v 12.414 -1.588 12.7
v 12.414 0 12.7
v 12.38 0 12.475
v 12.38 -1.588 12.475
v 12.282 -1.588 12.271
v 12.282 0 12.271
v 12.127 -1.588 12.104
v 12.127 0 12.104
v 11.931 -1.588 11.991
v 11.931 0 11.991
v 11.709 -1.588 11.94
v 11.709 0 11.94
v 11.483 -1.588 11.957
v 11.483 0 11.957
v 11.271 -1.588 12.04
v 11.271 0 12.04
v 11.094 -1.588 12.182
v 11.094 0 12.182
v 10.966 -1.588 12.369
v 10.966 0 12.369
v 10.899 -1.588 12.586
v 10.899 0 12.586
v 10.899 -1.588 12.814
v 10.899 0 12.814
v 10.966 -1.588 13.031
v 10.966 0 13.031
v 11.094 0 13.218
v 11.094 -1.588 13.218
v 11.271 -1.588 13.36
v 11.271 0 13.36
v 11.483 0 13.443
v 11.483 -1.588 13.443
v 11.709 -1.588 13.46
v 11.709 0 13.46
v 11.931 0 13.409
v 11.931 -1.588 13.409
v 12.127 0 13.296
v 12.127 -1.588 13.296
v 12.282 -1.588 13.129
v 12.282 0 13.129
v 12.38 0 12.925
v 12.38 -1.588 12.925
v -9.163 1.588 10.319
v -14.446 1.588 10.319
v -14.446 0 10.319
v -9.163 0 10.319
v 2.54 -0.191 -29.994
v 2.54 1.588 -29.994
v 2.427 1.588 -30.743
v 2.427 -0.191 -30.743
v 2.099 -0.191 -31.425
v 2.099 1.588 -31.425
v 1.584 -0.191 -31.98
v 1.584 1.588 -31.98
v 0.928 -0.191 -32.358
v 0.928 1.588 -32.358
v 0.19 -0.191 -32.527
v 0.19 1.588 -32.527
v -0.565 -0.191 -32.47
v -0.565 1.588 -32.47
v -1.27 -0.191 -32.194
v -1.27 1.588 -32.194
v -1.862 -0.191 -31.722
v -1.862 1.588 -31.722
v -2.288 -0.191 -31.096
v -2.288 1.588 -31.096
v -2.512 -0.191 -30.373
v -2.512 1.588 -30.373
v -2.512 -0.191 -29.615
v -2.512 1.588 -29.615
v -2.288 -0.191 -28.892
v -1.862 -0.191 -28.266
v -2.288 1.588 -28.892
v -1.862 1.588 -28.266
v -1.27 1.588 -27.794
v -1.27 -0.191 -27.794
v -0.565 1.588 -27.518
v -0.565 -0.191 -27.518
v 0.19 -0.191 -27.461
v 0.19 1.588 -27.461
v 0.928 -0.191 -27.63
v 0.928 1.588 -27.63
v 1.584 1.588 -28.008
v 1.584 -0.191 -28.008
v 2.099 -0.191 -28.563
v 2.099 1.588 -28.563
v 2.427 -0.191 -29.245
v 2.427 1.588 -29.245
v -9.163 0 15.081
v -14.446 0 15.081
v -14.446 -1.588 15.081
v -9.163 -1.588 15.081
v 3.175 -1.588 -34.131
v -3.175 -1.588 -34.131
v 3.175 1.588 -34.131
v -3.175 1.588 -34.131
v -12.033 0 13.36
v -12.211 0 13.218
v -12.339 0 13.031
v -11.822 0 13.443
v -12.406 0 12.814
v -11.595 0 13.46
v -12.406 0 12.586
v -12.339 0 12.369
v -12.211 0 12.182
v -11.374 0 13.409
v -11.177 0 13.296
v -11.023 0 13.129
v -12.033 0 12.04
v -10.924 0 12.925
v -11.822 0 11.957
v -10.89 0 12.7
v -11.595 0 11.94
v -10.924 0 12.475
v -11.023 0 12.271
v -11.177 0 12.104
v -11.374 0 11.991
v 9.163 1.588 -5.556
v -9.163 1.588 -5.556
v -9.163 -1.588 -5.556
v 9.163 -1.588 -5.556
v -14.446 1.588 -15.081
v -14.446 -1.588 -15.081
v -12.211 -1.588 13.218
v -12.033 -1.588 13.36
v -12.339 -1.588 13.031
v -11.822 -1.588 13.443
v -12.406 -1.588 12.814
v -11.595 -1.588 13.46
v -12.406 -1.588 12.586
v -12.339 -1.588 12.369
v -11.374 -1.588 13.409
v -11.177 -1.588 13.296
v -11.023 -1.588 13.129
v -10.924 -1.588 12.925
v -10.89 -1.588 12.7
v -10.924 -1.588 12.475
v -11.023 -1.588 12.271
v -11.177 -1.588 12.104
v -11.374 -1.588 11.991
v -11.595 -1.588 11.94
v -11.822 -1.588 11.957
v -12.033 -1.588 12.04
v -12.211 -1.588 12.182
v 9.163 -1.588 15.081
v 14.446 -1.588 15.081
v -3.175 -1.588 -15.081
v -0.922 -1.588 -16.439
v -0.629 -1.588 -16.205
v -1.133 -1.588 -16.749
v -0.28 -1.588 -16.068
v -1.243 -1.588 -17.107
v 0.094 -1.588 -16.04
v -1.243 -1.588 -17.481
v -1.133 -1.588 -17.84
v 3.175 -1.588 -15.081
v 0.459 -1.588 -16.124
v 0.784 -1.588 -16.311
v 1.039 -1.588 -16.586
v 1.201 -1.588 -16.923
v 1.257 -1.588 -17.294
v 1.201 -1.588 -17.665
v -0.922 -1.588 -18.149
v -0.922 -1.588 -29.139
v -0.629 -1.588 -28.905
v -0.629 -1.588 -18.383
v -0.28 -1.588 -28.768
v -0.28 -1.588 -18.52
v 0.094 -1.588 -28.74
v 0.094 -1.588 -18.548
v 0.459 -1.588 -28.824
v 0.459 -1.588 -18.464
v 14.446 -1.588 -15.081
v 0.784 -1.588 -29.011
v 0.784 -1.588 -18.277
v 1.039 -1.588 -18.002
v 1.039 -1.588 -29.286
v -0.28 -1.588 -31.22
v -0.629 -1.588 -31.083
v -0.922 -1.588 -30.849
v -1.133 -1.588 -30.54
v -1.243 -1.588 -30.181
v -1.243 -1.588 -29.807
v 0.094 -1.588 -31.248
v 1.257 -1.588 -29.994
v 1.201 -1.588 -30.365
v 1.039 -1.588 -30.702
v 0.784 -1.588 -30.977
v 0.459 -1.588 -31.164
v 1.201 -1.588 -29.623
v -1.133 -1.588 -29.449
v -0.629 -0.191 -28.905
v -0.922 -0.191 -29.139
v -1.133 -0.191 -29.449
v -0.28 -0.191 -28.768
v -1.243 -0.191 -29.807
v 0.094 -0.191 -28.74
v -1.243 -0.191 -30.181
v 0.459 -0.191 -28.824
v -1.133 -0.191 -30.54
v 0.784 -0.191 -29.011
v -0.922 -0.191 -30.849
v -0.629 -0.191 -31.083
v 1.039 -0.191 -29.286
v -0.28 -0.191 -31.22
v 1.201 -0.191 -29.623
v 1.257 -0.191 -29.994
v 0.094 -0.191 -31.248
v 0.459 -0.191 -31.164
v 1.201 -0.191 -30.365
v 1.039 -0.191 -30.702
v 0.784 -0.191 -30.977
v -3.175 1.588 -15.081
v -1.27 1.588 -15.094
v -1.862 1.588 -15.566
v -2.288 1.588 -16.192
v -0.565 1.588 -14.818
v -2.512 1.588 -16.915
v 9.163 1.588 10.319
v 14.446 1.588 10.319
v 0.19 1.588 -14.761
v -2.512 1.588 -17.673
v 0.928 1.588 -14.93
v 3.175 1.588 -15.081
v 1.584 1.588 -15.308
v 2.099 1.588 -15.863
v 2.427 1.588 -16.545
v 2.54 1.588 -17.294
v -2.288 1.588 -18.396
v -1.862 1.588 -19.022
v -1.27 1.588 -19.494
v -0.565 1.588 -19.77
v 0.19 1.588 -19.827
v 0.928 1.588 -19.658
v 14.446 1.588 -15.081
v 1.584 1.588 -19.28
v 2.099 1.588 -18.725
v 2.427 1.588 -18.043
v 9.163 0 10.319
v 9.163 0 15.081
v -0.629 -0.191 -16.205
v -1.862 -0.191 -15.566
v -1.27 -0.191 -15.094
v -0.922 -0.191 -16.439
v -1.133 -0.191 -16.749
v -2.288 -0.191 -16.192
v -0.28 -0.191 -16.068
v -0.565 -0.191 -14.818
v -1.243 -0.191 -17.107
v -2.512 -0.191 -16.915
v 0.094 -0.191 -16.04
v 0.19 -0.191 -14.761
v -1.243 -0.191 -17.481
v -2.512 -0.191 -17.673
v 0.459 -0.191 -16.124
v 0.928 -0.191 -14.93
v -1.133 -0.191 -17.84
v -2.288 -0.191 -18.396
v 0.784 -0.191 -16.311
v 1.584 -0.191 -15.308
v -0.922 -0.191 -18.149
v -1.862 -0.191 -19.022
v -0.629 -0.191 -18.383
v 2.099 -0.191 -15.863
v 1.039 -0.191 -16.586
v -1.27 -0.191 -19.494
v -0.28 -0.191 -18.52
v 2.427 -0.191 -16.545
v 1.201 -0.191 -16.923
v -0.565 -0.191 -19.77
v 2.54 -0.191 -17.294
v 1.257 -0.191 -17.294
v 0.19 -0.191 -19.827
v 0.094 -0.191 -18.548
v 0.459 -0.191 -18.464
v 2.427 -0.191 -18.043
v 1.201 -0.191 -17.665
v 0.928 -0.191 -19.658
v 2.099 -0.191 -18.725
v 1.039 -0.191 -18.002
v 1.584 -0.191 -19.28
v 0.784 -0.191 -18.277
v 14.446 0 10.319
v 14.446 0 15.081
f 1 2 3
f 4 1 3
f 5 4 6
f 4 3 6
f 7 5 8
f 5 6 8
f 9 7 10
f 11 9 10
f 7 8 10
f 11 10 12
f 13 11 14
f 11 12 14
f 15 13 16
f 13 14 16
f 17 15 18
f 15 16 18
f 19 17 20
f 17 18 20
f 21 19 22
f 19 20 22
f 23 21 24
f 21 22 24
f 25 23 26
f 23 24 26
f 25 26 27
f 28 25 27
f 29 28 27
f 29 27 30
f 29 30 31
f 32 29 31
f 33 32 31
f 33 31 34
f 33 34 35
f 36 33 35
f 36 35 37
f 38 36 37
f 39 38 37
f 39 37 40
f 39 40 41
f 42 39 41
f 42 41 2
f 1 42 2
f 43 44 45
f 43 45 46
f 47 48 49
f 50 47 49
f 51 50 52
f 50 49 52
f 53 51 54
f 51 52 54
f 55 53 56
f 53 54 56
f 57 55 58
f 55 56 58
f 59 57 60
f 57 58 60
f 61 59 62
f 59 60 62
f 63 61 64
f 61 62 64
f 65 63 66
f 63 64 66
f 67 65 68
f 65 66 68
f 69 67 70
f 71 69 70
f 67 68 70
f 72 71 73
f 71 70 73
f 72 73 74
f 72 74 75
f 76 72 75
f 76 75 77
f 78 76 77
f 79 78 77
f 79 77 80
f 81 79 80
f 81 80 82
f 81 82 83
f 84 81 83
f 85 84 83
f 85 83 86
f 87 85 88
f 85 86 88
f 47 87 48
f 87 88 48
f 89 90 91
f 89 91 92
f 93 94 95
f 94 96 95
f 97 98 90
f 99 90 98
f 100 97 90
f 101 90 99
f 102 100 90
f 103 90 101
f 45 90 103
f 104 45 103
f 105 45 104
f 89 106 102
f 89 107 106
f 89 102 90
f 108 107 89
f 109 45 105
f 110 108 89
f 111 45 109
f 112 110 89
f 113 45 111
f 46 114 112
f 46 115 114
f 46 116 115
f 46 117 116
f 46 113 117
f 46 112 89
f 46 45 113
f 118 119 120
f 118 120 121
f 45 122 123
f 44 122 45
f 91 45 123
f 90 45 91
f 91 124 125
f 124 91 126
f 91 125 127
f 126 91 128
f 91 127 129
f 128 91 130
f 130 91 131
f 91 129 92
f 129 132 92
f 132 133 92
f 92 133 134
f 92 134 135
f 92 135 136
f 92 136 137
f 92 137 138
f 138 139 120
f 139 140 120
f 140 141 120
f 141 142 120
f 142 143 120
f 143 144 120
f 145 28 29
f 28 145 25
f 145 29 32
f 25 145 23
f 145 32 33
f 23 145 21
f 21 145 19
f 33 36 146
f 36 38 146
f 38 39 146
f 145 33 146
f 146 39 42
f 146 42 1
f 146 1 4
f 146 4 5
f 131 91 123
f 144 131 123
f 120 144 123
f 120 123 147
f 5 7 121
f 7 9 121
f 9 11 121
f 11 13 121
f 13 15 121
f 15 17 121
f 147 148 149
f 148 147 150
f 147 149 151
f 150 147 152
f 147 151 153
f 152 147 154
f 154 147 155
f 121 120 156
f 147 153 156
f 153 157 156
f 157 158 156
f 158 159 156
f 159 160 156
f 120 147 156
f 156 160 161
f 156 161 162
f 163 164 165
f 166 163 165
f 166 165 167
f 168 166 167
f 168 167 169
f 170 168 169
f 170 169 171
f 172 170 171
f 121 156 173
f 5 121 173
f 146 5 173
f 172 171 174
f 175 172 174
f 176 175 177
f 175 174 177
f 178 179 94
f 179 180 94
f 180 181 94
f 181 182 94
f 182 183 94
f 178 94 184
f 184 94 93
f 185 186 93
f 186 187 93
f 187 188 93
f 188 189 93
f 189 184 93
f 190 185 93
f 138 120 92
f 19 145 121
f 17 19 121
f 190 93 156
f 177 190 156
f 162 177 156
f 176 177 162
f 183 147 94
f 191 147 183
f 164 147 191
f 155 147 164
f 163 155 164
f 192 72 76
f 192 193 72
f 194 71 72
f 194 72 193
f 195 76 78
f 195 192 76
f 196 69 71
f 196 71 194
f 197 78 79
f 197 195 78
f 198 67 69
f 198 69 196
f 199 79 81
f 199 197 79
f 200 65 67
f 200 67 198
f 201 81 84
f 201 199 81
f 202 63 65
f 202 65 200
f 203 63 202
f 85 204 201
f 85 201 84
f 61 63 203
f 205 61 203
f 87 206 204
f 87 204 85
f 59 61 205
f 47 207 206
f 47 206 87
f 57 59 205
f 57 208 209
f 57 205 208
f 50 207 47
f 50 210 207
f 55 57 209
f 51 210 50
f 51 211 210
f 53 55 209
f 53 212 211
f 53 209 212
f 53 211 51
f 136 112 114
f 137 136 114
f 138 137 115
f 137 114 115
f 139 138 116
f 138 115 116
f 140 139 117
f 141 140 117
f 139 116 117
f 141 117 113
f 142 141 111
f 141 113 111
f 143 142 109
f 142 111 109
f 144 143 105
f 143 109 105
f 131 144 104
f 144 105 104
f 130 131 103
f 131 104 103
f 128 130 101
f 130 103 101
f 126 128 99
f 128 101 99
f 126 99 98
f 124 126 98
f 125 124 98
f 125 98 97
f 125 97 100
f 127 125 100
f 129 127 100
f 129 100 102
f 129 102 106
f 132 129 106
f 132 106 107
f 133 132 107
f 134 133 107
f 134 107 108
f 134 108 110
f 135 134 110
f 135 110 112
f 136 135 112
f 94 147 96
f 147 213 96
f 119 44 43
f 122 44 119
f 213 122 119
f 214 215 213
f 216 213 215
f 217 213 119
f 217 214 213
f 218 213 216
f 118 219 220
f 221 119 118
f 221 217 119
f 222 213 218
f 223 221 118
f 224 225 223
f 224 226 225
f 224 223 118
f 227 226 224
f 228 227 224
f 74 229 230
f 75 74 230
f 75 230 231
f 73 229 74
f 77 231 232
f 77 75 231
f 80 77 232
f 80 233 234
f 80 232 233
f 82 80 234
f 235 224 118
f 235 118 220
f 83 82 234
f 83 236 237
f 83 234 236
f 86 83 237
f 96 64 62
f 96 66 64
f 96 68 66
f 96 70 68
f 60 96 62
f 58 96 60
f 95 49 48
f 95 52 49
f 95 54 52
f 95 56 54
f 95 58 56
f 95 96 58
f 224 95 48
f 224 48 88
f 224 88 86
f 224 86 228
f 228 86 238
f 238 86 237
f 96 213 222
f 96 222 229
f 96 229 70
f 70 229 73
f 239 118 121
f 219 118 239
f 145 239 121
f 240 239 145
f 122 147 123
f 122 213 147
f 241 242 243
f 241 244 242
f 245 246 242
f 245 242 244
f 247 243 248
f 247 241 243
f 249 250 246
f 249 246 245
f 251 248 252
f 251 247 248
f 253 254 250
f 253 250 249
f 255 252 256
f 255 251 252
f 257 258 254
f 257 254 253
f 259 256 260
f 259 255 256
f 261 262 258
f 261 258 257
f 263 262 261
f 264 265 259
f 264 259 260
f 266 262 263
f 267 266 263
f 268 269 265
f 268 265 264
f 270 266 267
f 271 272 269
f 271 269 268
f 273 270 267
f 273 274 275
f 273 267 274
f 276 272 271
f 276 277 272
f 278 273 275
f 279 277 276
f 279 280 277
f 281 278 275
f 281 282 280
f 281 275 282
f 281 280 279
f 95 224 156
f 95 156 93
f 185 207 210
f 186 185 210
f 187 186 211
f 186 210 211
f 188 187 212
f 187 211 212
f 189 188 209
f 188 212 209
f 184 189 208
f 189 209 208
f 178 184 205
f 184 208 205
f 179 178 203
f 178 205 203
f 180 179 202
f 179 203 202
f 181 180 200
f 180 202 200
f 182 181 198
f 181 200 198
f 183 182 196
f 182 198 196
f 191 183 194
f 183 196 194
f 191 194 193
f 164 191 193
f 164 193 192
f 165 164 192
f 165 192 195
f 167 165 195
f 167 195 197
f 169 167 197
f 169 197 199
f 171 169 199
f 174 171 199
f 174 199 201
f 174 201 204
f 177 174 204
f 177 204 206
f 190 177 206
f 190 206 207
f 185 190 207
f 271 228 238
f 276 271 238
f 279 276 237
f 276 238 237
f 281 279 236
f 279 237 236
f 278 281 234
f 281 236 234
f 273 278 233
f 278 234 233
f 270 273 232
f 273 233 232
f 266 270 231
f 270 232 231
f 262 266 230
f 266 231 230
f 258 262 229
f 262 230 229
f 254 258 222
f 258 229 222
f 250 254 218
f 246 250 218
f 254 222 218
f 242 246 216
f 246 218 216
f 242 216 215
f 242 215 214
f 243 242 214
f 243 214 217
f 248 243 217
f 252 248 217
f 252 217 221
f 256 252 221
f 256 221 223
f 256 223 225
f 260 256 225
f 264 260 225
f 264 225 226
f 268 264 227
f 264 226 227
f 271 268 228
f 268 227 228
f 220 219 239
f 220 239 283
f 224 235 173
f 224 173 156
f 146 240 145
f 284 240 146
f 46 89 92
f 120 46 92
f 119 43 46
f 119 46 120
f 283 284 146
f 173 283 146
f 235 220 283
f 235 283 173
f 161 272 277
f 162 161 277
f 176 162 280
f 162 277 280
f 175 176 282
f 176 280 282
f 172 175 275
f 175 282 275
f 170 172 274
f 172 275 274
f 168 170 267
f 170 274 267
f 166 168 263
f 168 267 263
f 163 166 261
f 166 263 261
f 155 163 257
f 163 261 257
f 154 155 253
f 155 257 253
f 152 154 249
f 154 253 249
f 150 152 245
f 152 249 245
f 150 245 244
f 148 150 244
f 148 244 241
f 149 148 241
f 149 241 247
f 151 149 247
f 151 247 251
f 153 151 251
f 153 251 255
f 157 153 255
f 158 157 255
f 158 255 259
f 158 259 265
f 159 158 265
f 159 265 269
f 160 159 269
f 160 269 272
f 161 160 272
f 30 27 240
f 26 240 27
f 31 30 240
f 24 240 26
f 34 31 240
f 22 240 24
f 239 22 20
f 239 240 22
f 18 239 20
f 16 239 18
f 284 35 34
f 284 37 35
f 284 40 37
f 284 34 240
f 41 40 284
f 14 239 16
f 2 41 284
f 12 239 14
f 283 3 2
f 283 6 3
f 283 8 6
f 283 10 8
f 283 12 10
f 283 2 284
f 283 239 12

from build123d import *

# Parameters (mm, degrees)
SKETCH1_W           = 6.35
SKETCH1_H           = 19.05
BOSS_EXTRUDE1_DEPTH = 1.5875
SKETCH2_W           = 5.2832
SKETCH2_H           = 4.7625
CUT_EXTRUDE1_DEPTH  = 1.5875
SKETCH3_R           = 0.762
SKETCH3_R_2         = 1.2573
CUT_EXTRUDE2_DEPTH  = 3.175
SKETCH31_R          = 2.54
CUT_EXTRUDE5_DEPTH  = 1.778


with BuildPart() as part:
    # Sketch1 → Boss-Extrude1 (new body, symmetric)
    with BuildSketch(Plane(origin=(0, 0, 0), x_dir=(1, 0, 0), z_dir=(0, 1, 0))):
        Polygon((-3.175, 15.08125), (-14.44625, 15.08125), (-14.44625, -15.08125), (-9.16305, -15.08125), (-9.16305, 5.55625), (9.16305, 5.55625), (9.16305, -15.08125), (14.44625, -15.08125), (14.44625, 15.08125), (3.175, 15.08125), align=None)
        with Locations((0, 24.60625)):
            Rectangle(SKETCH1_W, SKETCH1_H)
    extrude(amount=BOSS_EXTRUDE1_DEPTH, both=True)

    # Sketch2 → Cut-Extrude1 (cut)
    with BuildSketch(Plane(origin=(0, 1.5875, 0), x_dir=(1, 0, 0), z_dir=(0, 1, 0))):
        with Locations((-11.80465, -12.7)):
            Rectangle(SKETCH2_W, SKETCH2_H)
        with Locations((11.80465, -12.7)):
            Rectangle(SKETCH2_W, SKETCH2_H)
    extrude(amount=-CUT_EXTRUDE1_DEPTH, mode=Mode.SUBTRACT)

    # Sketch3 → Cut-Extrude2 (cut)
    with BuildSketch(Plane(origin=(0, 1.5875, 0), x_dir=(1, 0, 0), z_dir=(0, 1, 0))):
        with Locations((-11.65225, -12.7)):
            Circle(SKETCH3_R)
        with Locations((11.65225, -12.7)):
            Circle(SKETCH3_R)
        with Locations((0, 17.294029814)):
            Circle(SKETCH3_R_2)
        with Locations((0, 29.994029814)):
            Circle(SKETCH3_R_2)
    extrude(amount=-CUT_EXTRUDE2_DEPTH, mode=Mode.SUBTRACT)

    # Sketch31 → Cut-Extrude5 (cut)
    with BuildSketch(Plane(origin=(0, 1.5875, 0), x_dir=(1, 0, 0), z_dir=(0, 1, 0))):
        with Locations((0, 17.294029814)):
            Circle(SKETCH31_R)
        with Locations((0, 29.994029814)):
            Circle(SKETCH31_R)
    extrude(amount=-CUT_EXTRUDE5_DEPTH, mode=Mode.SUBTRACT)


solid = part.part
